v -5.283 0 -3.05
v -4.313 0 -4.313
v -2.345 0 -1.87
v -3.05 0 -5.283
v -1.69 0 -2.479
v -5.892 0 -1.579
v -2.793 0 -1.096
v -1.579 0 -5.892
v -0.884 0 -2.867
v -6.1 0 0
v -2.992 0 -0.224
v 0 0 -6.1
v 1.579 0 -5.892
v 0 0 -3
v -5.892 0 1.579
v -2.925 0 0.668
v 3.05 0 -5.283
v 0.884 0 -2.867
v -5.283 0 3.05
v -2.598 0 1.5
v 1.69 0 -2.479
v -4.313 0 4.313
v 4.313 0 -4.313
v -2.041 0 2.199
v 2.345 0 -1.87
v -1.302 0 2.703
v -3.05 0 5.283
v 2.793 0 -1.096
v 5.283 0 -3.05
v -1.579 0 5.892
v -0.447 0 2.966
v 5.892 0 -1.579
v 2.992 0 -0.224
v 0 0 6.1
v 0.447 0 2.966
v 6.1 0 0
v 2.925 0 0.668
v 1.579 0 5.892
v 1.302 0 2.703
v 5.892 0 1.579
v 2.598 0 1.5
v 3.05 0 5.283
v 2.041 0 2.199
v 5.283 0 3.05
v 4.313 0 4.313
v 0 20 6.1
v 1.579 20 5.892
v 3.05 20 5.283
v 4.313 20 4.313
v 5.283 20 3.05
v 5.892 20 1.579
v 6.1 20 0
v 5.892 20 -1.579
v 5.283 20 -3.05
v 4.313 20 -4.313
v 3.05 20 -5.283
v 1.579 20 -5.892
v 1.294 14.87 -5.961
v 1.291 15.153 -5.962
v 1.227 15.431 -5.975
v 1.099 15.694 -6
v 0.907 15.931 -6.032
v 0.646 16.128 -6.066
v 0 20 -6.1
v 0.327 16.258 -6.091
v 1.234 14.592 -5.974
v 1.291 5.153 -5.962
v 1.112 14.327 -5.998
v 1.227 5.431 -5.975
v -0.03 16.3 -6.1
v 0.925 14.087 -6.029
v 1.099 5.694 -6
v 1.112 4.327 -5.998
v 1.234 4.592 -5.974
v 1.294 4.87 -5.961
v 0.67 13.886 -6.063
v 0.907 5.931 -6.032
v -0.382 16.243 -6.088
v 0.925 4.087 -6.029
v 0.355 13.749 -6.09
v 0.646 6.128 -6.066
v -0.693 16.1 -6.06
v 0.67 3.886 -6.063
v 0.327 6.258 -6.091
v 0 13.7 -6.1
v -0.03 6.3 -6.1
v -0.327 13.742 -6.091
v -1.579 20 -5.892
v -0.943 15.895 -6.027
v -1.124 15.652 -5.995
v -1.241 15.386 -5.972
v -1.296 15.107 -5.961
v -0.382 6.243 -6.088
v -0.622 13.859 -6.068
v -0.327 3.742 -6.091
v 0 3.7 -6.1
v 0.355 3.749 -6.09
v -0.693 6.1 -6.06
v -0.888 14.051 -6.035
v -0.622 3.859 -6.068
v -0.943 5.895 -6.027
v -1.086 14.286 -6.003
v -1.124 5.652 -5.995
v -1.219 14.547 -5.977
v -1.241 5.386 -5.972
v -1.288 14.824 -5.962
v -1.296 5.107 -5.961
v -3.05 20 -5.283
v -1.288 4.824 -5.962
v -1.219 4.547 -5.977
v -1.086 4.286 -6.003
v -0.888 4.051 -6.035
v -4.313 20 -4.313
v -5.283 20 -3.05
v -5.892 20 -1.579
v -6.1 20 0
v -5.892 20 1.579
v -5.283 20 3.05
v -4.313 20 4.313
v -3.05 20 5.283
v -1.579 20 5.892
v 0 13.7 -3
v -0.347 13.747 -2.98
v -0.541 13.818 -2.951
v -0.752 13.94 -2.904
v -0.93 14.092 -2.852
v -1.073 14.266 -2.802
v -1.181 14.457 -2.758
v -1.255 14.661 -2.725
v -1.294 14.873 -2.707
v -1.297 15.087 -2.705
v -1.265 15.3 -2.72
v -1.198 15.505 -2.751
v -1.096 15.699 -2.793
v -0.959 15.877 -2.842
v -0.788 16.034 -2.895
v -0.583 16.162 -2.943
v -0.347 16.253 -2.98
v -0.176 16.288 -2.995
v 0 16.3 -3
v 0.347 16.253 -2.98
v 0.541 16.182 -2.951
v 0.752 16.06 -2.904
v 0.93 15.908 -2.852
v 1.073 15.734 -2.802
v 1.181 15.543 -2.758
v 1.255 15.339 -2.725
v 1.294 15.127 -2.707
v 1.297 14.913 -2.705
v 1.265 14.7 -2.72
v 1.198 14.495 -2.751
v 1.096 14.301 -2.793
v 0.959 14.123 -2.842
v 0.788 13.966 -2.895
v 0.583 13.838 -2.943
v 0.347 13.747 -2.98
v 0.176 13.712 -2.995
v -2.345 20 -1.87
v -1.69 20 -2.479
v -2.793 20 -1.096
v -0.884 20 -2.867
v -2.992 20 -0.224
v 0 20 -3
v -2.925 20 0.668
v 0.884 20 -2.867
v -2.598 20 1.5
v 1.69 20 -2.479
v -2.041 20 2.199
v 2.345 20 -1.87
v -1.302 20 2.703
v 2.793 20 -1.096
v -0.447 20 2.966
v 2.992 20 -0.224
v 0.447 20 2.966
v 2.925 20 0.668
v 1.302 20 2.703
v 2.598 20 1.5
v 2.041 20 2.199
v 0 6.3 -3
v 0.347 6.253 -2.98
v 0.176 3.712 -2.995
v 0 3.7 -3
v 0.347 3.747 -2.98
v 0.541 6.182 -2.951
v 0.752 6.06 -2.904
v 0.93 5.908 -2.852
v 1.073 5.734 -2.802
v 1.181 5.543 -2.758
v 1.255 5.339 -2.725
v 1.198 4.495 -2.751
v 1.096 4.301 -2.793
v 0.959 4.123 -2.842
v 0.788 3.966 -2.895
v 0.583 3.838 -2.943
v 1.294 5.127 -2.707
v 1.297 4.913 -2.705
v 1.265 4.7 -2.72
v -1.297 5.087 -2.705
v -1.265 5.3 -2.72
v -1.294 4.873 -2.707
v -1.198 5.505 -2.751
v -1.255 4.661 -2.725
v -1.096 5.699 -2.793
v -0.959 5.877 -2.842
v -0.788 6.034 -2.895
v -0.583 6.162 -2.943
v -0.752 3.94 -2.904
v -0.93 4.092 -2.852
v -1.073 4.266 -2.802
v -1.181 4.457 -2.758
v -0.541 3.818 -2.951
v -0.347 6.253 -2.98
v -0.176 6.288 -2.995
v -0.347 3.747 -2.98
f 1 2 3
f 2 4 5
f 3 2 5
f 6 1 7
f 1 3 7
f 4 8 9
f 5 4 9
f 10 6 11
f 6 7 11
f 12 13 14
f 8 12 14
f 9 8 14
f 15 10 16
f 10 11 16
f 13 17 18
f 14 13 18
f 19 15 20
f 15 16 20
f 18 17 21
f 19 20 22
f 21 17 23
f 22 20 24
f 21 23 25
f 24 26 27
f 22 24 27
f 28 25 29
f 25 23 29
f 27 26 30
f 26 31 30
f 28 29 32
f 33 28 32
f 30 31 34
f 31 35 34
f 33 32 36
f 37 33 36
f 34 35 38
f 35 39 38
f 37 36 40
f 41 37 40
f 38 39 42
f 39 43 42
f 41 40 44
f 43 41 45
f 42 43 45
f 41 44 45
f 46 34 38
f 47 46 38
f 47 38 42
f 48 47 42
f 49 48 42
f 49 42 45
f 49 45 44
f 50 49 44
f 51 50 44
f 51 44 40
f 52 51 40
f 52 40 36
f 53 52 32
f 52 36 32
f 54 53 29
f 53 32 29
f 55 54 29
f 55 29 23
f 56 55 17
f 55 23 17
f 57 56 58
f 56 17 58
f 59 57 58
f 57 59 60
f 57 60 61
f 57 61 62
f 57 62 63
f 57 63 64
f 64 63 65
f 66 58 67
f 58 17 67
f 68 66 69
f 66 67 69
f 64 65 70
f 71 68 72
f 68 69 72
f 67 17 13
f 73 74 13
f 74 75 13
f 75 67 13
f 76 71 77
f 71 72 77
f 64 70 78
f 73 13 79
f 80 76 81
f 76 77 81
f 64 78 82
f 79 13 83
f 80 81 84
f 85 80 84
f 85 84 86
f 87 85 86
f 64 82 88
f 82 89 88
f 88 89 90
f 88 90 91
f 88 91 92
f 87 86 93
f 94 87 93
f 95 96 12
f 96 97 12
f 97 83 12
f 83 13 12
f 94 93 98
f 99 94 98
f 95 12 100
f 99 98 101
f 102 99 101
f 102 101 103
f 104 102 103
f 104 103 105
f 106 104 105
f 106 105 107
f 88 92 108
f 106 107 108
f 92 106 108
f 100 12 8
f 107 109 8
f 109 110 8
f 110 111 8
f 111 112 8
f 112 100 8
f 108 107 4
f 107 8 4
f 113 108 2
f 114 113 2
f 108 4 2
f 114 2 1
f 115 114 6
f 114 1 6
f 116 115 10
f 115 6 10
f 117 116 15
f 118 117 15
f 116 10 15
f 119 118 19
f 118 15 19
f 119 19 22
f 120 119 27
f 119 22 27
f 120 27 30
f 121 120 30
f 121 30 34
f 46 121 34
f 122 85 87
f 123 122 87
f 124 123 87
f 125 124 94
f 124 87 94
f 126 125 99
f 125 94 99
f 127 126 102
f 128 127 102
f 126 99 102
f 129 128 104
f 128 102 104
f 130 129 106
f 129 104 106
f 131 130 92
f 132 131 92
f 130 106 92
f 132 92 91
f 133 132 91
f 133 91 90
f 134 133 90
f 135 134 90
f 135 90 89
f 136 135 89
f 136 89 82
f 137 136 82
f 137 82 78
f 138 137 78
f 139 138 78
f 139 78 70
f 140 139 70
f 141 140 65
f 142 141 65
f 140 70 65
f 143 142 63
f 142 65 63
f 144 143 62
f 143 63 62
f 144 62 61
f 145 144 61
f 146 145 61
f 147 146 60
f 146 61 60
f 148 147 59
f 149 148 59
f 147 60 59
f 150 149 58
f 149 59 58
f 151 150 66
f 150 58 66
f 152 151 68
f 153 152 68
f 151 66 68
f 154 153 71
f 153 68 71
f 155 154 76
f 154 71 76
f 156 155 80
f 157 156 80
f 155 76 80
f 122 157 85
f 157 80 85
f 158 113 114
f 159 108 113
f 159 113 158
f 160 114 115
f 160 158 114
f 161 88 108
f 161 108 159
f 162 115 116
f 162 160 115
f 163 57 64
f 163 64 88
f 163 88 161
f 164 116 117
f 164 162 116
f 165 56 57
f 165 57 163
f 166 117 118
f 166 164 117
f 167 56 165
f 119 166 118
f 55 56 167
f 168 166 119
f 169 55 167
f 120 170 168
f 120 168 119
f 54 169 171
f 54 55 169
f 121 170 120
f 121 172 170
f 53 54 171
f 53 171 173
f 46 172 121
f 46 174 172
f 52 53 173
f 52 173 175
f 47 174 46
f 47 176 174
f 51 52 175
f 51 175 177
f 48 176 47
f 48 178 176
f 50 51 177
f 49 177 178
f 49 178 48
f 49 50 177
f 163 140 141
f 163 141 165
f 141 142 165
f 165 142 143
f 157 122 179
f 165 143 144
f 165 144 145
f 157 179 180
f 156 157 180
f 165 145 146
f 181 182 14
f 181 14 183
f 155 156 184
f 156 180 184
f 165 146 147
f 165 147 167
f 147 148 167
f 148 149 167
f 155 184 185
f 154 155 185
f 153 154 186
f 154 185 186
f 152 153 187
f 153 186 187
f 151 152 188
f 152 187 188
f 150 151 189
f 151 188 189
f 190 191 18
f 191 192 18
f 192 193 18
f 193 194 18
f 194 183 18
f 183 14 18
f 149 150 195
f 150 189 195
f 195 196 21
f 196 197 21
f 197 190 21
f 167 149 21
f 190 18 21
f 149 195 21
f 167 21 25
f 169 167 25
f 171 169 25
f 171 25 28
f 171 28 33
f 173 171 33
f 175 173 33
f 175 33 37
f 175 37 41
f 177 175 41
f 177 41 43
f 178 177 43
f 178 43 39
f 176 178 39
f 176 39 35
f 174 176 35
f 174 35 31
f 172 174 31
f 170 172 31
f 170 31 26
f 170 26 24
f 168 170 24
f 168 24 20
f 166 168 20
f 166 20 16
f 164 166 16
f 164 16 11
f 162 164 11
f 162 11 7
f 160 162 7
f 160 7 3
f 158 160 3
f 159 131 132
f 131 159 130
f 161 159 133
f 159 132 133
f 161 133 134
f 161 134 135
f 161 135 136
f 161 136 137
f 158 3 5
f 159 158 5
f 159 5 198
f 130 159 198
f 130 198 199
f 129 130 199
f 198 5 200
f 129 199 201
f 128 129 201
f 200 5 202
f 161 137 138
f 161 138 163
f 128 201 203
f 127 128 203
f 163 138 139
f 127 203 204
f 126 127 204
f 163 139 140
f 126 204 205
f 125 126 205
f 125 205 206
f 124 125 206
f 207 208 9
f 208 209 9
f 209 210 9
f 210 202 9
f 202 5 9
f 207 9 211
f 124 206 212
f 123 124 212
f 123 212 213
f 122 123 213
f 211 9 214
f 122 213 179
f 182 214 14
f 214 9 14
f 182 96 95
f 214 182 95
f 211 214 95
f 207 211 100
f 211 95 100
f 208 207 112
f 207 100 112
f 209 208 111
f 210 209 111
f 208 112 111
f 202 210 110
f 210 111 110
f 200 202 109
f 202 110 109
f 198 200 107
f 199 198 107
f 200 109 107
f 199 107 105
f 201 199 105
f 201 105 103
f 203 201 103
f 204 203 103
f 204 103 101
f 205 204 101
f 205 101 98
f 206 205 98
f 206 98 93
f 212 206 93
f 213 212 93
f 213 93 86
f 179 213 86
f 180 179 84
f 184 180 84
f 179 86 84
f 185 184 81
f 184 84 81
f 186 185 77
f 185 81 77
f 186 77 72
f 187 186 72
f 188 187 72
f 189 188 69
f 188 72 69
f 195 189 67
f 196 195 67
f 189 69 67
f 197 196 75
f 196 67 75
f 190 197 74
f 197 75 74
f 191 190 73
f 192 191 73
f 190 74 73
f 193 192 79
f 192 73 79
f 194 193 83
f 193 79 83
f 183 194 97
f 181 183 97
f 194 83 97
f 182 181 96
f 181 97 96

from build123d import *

# Parameters (mm, degrees)
CROQUIS1_R                            = 6.1
SALIENTE_EXTRUIR1_DEPTH               = 20
CROQUIS3_R                            = 3
CORTAR_EXTRUIR1_DEPTH                 = 22.781184541
CROQUIS5_W                            = 1.3
CROQUIS5_H                            = 6.1
TALADRO_DE_MARGEN_PARA_M21_AT_2_COUNT = 2
TALADRO_DE_MARGEN_PARA_M21_AT_2_PITCH = 10


with BuildPart() as part:
    # Croquis1 → Saliente-Extruir1 (new body)
    with BuildSketch(Plane(origin=(0, 0, 0), x_dir=(-1, 0, 0), z_dir=(0, 1, 0))):
        with Locations(Location((0, 0, 0), (0, 0, 90))):
            Circle(CROQUIS1_R)
    extrude(amount=SALIENTE_EXTRUIR1_DEPTH)

    # Croquis3 → Cortar-Extruir1 (cut, through all)
    with BuildSketch(Plane.XZ):
        with Locations(Location((0, 0, 0), (0, 0, 270))):
            Circle(CROQUIS3_R)
    extrude(amount=-CORTAR_EXTRUIR1_DEPTH, mode=Mode.SUBTRACT)

    # Croquis5 → Taladro de margen para M21 (revolve, cut)
    with BuildSketch(Plane(origin=(0, 15, 0), x_dir=(0, -1, 0), z_dir=(1, 0, 0))):
        with Locations((0.65, 3.05)):
            Rectangle(CROQUIS5_W, CROQUIS5_H)
    taladro_de_margen_para_m21 = revolve(axis=Axis((0, 15, 6.35), (0, 0, -1)), mode=Mode.SUBTRACT)

    # Taladro de margen para M21 at 2: Taladro de margen para M21 ×2
    with Locations(*[(0, -i * TALADRO_DE_MARGEN_PARA_M21_AT_2_PITCH, 0) for i in range(1, TALADRO_DE_MARGEN_PARA_M21_AT_2_COUNT)]):
        add(taladro_de_margen_para_m21, mode=Mode.SUBTRACT)


solid = part.part
